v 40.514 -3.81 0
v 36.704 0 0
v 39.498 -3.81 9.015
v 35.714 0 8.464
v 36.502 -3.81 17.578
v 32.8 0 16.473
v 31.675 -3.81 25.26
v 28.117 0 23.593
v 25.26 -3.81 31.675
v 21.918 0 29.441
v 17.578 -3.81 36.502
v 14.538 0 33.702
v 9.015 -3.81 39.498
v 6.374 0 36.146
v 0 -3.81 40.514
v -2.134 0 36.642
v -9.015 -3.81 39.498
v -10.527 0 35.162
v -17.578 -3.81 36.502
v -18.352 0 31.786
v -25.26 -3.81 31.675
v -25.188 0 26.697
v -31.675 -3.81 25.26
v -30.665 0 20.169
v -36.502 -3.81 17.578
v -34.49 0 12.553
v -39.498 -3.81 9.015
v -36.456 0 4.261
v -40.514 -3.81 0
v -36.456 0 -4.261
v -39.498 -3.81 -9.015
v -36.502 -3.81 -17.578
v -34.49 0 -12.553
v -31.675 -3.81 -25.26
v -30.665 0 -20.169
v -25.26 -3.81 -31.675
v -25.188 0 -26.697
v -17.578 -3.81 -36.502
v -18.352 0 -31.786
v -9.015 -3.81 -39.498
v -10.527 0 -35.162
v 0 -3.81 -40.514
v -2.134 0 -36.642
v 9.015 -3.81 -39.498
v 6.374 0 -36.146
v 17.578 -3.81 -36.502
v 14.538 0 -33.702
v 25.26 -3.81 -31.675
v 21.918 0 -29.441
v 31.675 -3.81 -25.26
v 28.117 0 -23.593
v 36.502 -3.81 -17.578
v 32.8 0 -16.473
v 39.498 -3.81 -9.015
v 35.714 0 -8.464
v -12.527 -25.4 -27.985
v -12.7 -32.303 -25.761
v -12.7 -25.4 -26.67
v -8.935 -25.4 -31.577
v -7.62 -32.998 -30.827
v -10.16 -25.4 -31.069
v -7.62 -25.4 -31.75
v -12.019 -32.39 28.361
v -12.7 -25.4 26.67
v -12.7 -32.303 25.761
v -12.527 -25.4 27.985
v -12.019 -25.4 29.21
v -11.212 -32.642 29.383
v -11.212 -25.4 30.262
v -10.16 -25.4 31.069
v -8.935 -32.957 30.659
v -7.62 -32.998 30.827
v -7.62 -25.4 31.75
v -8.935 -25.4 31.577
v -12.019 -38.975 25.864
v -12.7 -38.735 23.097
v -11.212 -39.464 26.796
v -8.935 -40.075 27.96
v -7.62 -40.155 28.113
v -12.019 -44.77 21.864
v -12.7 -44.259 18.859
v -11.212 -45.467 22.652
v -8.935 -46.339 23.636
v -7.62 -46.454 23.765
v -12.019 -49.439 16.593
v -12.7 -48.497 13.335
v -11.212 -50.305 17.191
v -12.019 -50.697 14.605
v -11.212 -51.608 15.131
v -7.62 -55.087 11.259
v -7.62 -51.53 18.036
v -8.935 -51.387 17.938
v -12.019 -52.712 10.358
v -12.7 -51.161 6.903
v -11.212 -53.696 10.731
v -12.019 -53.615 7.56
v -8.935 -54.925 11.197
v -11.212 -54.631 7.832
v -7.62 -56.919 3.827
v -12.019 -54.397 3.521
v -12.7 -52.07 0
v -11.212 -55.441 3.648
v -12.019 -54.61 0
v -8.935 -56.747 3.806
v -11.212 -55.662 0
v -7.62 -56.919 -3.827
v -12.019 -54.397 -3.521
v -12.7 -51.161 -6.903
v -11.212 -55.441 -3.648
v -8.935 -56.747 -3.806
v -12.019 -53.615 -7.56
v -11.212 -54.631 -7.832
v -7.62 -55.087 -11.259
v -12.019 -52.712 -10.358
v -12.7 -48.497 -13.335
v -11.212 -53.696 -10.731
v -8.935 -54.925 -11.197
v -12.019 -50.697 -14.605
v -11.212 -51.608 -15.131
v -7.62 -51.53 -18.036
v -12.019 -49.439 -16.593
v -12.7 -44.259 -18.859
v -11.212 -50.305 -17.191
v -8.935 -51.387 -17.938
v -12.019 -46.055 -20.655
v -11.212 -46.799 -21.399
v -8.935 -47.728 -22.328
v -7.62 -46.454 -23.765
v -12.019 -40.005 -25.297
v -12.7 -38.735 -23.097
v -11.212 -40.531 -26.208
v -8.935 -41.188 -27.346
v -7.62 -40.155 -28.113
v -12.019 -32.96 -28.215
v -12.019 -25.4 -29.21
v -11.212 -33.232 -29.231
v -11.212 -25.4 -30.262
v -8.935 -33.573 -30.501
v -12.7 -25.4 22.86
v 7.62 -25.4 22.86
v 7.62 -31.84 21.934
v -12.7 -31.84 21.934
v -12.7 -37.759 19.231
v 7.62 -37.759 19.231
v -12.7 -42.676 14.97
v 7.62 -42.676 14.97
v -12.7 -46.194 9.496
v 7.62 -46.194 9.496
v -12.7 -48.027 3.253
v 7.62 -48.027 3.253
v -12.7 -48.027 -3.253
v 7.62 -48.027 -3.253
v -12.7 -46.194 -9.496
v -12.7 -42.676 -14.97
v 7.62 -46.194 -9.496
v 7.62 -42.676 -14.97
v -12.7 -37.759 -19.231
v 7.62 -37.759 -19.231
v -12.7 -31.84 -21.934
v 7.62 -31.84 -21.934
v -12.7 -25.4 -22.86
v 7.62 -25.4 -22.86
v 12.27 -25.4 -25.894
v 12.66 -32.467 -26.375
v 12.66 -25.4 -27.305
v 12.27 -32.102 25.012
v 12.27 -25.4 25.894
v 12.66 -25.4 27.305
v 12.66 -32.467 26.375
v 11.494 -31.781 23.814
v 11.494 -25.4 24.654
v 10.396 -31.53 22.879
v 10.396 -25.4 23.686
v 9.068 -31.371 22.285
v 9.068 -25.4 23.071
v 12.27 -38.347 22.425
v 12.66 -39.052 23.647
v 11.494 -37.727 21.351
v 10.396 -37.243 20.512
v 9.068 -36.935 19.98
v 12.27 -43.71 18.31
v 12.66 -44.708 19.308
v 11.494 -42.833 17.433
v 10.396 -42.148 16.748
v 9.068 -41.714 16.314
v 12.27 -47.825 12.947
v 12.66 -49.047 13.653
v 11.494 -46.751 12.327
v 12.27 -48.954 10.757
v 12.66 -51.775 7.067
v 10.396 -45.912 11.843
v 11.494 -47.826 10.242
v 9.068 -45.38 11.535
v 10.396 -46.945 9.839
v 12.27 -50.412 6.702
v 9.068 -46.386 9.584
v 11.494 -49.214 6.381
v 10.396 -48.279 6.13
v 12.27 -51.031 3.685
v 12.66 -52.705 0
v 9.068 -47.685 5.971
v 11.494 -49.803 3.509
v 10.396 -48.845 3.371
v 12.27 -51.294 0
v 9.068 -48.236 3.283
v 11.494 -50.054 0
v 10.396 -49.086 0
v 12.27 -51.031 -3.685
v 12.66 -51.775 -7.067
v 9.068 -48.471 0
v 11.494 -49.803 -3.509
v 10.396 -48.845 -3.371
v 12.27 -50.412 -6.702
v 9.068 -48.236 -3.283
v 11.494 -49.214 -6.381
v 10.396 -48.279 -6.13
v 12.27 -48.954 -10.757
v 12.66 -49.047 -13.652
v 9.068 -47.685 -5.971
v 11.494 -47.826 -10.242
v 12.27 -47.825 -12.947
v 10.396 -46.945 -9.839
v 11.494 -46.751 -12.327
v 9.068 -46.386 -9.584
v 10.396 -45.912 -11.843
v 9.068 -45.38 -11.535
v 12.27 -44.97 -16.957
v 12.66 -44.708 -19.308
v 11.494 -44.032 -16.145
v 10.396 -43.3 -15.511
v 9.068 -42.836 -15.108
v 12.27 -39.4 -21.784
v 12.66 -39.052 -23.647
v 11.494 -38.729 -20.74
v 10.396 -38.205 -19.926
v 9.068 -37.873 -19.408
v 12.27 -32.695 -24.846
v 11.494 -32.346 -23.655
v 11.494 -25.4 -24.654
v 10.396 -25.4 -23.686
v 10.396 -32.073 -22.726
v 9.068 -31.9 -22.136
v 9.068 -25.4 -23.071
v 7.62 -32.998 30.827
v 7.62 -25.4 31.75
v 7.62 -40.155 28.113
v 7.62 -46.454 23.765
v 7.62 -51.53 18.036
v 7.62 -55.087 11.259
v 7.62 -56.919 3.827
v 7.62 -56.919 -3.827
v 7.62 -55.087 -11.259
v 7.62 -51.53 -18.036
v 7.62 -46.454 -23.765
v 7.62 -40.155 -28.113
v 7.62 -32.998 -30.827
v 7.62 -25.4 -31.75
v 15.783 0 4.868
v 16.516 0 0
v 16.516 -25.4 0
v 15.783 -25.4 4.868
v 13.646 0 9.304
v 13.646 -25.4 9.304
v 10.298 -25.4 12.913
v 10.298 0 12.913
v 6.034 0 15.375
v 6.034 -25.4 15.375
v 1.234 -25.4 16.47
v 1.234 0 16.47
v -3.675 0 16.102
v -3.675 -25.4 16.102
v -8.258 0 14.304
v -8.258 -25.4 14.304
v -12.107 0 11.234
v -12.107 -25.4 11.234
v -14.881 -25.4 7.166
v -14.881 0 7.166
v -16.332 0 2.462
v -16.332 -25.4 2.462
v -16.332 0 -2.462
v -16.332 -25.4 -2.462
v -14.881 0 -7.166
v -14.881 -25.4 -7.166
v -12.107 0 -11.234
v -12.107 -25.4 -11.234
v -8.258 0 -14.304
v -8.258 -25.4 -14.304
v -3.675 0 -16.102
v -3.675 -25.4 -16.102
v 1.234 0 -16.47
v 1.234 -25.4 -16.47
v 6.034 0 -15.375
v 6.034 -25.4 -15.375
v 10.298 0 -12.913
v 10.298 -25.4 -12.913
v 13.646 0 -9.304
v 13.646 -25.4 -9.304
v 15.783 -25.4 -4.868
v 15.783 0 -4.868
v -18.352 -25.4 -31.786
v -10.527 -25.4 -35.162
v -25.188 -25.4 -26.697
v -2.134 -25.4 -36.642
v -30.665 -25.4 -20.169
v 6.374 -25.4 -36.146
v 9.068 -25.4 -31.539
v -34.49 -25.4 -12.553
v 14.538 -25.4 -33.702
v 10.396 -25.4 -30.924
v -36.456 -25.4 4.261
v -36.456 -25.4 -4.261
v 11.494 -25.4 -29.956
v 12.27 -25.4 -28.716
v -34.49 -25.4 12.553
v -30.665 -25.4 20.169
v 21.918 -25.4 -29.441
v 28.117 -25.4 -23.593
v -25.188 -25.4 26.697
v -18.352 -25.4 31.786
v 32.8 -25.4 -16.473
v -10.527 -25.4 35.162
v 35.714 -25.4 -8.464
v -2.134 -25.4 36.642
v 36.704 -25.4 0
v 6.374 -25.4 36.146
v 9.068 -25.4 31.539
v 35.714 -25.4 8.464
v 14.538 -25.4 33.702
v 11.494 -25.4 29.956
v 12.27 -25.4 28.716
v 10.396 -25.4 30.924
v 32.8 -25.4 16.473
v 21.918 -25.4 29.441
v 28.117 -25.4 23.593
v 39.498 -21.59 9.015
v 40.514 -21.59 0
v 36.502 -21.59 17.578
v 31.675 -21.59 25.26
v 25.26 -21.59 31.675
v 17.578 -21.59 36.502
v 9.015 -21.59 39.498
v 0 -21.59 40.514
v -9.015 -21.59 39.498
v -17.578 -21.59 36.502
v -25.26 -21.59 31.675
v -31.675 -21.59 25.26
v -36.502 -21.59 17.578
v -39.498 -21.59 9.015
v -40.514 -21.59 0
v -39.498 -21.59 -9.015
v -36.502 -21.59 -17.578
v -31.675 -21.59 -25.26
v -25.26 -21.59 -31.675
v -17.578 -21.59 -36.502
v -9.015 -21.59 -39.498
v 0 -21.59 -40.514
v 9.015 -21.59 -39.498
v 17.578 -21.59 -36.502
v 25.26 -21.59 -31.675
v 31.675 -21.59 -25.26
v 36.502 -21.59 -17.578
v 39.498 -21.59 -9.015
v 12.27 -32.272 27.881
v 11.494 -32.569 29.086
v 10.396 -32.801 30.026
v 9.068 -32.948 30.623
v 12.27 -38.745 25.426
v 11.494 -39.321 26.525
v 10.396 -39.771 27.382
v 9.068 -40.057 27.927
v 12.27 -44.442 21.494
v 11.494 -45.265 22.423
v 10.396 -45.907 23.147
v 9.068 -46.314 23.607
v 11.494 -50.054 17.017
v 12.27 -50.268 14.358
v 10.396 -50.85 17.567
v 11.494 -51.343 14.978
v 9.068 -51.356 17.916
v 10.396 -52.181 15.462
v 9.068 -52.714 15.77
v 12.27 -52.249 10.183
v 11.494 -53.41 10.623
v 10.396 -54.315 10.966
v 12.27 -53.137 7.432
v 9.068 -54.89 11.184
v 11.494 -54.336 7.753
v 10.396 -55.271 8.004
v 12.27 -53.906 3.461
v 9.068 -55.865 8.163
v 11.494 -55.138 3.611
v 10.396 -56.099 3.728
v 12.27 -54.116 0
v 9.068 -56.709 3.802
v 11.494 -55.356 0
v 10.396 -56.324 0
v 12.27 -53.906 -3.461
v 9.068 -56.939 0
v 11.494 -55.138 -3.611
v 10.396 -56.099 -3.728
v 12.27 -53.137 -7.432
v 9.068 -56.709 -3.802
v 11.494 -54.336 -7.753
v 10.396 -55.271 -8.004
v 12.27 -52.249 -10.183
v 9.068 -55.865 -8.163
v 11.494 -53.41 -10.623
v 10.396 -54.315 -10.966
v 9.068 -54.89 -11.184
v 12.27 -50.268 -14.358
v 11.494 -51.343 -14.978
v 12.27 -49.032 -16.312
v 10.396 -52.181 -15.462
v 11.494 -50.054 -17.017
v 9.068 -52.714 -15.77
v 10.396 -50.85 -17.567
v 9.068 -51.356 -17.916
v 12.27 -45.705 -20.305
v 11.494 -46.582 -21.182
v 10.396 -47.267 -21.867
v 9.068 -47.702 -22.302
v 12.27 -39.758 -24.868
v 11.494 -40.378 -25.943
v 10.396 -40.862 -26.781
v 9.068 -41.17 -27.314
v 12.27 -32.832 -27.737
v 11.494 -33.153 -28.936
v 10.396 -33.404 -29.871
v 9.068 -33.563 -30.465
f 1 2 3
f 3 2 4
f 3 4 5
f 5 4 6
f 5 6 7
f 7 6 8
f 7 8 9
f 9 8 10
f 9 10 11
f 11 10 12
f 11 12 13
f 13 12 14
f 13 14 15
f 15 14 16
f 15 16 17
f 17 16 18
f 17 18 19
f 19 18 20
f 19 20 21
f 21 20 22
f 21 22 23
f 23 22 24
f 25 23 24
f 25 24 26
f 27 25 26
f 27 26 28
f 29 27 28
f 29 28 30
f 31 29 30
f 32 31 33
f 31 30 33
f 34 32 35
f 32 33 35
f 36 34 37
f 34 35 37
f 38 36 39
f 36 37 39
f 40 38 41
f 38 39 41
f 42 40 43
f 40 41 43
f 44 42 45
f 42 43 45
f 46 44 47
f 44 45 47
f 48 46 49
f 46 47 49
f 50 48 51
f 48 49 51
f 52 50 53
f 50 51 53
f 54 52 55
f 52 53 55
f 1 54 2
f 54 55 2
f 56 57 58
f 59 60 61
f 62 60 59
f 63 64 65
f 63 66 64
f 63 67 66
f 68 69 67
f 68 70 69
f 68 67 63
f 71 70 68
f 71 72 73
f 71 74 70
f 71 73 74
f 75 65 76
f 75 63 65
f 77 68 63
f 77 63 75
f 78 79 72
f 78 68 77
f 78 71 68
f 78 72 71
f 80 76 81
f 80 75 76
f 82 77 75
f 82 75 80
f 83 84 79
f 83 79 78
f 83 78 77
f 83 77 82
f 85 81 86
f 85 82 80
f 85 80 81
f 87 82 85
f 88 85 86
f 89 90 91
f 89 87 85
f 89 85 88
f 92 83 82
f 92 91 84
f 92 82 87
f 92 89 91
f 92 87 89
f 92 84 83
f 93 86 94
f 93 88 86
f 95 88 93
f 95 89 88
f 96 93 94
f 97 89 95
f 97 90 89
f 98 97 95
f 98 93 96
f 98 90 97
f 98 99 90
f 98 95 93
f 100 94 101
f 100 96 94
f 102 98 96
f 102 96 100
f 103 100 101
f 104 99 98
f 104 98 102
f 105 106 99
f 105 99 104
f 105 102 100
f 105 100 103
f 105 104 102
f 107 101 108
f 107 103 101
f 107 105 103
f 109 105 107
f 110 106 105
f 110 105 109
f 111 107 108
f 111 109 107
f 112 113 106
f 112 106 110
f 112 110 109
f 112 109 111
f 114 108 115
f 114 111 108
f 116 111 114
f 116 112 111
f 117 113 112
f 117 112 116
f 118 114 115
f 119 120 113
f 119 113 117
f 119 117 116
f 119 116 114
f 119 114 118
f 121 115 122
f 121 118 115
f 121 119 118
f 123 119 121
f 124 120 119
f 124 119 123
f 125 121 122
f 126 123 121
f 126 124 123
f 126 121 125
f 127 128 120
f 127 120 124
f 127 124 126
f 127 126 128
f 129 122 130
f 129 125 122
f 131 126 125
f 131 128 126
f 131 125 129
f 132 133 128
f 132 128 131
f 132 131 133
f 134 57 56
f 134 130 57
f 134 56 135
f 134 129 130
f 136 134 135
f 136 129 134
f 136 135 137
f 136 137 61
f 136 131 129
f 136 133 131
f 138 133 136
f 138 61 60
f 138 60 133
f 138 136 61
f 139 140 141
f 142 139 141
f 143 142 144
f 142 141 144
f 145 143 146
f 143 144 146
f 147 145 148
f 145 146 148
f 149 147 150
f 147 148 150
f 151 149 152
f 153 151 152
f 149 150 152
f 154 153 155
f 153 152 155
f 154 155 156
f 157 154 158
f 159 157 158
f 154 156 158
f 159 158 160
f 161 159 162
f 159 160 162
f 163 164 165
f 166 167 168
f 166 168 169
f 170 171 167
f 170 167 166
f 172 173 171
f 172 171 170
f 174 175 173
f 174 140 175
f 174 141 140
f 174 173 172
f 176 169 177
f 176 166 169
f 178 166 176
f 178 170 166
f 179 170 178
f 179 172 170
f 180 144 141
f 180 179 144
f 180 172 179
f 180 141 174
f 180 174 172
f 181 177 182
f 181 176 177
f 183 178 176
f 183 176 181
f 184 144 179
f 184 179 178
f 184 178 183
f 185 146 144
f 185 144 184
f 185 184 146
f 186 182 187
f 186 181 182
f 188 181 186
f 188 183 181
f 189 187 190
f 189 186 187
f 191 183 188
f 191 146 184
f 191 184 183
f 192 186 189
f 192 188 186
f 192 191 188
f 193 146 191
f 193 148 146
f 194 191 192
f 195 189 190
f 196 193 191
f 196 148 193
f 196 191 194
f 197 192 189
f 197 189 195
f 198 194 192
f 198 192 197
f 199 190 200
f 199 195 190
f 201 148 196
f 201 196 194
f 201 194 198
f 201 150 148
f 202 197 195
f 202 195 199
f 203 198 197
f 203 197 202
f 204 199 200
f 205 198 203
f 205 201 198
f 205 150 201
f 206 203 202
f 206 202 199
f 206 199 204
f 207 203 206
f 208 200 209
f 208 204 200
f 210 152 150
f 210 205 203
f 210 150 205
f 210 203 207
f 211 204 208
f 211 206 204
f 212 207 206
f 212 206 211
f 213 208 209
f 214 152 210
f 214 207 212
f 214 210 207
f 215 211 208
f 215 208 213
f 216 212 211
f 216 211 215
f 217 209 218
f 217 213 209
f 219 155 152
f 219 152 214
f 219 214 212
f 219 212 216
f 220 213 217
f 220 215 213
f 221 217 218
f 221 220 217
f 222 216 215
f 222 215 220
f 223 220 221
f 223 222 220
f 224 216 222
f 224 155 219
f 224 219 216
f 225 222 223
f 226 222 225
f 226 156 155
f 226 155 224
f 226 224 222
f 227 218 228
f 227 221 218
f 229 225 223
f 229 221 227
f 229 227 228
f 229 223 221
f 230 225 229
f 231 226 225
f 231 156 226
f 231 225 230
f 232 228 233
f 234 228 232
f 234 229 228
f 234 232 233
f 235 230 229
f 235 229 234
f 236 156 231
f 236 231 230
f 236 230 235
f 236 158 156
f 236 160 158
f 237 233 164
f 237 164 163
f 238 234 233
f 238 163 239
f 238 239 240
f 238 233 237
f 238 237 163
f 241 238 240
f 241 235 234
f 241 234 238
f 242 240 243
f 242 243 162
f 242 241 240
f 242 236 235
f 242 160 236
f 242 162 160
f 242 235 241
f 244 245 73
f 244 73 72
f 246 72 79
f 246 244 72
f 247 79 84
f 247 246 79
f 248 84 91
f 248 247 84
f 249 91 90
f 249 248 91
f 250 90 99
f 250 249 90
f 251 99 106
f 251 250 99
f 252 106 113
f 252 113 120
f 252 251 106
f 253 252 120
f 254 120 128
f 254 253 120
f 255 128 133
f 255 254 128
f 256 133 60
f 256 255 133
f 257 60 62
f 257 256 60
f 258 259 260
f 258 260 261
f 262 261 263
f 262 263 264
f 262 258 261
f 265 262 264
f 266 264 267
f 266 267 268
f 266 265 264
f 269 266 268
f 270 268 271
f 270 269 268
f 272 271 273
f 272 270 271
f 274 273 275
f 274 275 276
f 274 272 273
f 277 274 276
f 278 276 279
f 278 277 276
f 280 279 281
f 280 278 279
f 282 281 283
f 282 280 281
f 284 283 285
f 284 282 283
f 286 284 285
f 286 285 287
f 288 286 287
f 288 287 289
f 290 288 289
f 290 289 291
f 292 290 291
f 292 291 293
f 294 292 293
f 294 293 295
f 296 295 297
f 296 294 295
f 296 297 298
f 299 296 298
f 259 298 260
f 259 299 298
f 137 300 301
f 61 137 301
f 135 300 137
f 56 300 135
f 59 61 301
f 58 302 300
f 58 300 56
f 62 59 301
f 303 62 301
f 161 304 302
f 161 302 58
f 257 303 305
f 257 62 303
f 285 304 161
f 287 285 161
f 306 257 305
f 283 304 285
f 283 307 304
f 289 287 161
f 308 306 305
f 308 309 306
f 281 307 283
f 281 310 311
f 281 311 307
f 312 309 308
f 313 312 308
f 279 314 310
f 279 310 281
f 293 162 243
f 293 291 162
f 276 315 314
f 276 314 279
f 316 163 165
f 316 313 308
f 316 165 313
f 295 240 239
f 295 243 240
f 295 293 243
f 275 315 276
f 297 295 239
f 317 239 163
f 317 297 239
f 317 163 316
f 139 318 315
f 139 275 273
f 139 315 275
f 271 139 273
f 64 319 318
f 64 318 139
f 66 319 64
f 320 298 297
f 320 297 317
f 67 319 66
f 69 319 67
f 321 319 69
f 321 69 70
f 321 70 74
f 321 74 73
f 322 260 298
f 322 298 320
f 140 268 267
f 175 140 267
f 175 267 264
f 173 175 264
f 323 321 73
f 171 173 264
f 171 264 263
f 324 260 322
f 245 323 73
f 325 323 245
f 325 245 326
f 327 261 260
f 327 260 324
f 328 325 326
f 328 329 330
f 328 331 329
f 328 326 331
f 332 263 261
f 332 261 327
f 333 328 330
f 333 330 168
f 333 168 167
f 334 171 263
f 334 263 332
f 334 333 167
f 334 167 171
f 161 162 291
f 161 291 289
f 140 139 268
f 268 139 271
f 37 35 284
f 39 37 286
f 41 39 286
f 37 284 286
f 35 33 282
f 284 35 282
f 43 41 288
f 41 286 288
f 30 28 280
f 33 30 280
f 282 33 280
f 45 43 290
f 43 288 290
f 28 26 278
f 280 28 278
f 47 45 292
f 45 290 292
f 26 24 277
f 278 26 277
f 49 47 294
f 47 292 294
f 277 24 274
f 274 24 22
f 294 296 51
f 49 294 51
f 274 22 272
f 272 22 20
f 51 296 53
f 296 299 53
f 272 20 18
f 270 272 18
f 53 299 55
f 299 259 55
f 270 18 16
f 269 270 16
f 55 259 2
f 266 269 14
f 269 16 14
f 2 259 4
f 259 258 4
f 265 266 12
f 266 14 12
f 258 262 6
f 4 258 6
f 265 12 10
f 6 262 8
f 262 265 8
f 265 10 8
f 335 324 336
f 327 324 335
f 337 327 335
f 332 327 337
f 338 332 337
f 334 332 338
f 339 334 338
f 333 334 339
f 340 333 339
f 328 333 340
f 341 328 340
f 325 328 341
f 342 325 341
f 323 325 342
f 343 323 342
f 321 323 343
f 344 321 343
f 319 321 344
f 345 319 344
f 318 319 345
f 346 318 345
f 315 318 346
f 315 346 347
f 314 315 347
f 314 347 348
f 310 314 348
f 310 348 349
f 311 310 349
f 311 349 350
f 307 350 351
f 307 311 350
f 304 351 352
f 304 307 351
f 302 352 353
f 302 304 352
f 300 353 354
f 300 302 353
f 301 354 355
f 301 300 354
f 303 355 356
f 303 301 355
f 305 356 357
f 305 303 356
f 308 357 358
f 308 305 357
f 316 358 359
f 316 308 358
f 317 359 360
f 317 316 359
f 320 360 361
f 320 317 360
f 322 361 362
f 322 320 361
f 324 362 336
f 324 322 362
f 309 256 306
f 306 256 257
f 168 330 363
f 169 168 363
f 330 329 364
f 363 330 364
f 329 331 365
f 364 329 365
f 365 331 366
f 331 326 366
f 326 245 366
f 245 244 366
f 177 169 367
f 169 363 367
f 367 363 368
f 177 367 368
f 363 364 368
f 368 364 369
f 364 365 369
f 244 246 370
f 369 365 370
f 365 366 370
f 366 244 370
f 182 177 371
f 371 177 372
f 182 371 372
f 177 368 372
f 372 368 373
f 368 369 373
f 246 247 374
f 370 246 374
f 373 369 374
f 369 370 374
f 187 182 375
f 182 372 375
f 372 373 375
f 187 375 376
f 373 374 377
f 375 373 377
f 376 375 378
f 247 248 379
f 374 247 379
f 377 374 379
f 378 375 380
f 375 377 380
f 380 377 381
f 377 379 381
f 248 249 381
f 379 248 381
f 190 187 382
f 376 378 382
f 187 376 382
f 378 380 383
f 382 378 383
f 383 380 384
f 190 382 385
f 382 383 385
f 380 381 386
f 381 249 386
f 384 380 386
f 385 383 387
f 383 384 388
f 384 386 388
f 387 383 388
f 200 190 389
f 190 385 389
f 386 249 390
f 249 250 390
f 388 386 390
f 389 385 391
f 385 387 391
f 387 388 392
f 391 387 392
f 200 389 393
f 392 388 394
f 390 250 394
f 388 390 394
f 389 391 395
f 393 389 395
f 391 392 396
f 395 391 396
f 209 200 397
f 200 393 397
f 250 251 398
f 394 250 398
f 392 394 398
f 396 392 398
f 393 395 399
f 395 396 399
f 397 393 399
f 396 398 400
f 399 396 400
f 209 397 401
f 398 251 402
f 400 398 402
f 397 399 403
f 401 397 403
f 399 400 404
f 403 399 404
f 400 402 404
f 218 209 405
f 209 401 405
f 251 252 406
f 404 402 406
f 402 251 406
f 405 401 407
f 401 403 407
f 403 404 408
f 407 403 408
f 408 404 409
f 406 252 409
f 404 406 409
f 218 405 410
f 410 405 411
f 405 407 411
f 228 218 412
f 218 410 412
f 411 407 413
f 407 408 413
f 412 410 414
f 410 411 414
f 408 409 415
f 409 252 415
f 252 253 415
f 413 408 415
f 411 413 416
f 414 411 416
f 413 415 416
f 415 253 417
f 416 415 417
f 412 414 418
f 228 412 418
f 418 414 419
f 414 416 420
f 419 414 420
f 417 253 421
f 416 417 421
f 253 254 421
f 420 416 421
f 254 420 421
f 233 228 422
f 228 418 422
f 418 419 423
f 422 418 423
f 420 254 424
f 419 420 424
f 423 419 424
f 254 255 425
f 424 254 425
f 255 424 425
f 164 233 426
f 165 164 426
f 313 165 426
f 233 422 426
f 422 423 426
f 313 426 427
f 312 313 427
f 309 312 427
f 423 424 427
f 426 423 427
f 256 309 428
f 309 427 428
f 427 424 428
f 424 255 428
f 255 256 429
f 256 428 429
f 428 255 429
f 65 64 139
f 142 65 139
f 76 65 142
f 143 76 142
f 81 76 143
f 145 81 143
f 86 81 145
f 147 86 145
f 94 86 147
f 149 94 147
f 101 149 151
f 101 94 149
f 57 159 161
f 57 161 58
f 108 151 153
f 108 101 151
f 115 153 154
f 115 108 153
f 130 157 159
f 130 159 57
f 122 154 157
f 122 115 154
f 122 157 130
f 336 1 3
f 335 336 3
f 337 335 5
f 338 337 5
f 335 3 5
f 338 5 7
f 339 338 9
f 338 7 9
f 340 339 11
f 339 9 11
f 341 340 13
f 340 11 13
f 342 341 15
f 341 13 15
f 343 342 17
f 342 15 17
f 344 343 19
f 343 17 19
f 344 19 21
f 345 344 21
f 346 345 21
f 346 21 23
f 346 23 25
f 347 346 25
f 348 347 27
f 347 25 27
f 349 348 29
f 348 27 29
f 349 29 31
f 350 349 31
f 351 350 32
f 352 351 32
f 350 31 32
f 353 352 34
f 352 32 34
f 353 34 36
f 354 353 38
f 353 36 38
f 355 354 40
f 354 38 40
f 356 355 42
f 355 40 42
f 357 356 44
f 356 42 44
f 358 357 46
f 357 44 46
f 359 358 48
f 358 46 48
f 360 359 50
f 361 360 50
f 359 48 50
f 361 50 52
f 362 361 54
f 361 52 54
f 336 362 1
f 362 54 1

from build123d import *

# Parameters (mm, degrees)
F0_R        = 40.5136792868
F0_R_2      = 16.5163542796
F1_DEPTH    = 25.4
F2_W        = 25.4
F2_H        = 8.89
F3_ANGLE    = 180
F4_T2_ANGLE = 180
F4_T4_ANGLE = 180
F4_T6_ANGLE = 180
F5_SIZE     = 3.81


# Not quite as in the source:
# - a fillet or chamfer that OpenCascade refuses, or shapes differently, is made with other operations: its cross-section is extruded or revolved along the edge and cut away or added


with BuildPart() as f1:
    # F0 (on Front) → F1 (new body)
    with BuildSketch(Plane.XZ):
        Circle(F0_R)
        Circle(F0_R_2, mode=Mode.SUBTRACT)
    extrude(amount=F1_DEPTH)

    # F2 (on face) → F3 (revolve)
    with BuildSketch(Plane.XZ.offset(25.4)):
        with Locations((0, 27.305)):
            Rectangle(F2_W, F2_H)
    revolve(axis=Axis((-4.5374315232, -25.4, 0), (1, 0, 0)), revolution_arc=F3_ANGLE)

    # F4: fillet of radius 5.08 on 3 edges, made by hand

    # F4_s1 → F4_t2 (revolve, cut)
    with BuildSketch(Plane.XZ.offset(25.4)):
        with BuildLine():
            ThreePointArc((12.7, 27.94), (11.2121024484, 24.3478975516), (7.62, 22.86))
            Line((7.62, 22.86), (12.7, 22.86))
            Line((12.7, 22.86), (12.7, 27.94))
        make_face()
    revolve(axis=Axis((12.7, -25.4, 0), (1, 0, 0)), revolution_arc=F4_T2_ANGLE, mode=Mode.SUBTRACT)

    # F4_s3 → F4_t4 (revolve, cut)
    with BuildSketch(Plane.XZ.offset(25.4)):
        with BuildLine():
            ThreePointArc((12.7, 26.67), (11.2121024484, 30.2621024484), (7.62, 31.75))
            Line((7.62, 31.75), (12.7, 31.75))
            Line((12.7, 31.75), (12.7, 26.67))
        make_face()
    revolve(axis=Axis((12.7, -25.4, 0), (1, 0, 0)), revolution_arc=F4_T4_ANGLE, mode=Mode.SUBTRACT)

    # F4_s5 → F4_t6 (revolve, cut)
    with BuildSketch(Plane.XZ.offset(25.4)):
        with BuildLine():
            ThreePointArc((-12.7, 26.67), (-11.2121024484, 30.2621024484), (-7.62, 31.75))
            Line((-7.62, 31.75), (-12.7, 31.75))
            Line((-12.7, 31.75), (-12.7, 26.67))
        make_face()
    revolve(axis=Axis((-12.7, -25.4, 0), (1, 0, 0)), revolution_arc=F4_T6_ANGLE, mode=Mode.SUBTRACT)

    # F5
    f5_edges = [f1.edges().sort_by_distance(p)[0] for p in [
        (-40.513679, -25.4, 0),
        (-40.513679, 0, 0),
    ]]
    chamfer(f5_edges, length=F5_SIZE)


solid = f1.part
